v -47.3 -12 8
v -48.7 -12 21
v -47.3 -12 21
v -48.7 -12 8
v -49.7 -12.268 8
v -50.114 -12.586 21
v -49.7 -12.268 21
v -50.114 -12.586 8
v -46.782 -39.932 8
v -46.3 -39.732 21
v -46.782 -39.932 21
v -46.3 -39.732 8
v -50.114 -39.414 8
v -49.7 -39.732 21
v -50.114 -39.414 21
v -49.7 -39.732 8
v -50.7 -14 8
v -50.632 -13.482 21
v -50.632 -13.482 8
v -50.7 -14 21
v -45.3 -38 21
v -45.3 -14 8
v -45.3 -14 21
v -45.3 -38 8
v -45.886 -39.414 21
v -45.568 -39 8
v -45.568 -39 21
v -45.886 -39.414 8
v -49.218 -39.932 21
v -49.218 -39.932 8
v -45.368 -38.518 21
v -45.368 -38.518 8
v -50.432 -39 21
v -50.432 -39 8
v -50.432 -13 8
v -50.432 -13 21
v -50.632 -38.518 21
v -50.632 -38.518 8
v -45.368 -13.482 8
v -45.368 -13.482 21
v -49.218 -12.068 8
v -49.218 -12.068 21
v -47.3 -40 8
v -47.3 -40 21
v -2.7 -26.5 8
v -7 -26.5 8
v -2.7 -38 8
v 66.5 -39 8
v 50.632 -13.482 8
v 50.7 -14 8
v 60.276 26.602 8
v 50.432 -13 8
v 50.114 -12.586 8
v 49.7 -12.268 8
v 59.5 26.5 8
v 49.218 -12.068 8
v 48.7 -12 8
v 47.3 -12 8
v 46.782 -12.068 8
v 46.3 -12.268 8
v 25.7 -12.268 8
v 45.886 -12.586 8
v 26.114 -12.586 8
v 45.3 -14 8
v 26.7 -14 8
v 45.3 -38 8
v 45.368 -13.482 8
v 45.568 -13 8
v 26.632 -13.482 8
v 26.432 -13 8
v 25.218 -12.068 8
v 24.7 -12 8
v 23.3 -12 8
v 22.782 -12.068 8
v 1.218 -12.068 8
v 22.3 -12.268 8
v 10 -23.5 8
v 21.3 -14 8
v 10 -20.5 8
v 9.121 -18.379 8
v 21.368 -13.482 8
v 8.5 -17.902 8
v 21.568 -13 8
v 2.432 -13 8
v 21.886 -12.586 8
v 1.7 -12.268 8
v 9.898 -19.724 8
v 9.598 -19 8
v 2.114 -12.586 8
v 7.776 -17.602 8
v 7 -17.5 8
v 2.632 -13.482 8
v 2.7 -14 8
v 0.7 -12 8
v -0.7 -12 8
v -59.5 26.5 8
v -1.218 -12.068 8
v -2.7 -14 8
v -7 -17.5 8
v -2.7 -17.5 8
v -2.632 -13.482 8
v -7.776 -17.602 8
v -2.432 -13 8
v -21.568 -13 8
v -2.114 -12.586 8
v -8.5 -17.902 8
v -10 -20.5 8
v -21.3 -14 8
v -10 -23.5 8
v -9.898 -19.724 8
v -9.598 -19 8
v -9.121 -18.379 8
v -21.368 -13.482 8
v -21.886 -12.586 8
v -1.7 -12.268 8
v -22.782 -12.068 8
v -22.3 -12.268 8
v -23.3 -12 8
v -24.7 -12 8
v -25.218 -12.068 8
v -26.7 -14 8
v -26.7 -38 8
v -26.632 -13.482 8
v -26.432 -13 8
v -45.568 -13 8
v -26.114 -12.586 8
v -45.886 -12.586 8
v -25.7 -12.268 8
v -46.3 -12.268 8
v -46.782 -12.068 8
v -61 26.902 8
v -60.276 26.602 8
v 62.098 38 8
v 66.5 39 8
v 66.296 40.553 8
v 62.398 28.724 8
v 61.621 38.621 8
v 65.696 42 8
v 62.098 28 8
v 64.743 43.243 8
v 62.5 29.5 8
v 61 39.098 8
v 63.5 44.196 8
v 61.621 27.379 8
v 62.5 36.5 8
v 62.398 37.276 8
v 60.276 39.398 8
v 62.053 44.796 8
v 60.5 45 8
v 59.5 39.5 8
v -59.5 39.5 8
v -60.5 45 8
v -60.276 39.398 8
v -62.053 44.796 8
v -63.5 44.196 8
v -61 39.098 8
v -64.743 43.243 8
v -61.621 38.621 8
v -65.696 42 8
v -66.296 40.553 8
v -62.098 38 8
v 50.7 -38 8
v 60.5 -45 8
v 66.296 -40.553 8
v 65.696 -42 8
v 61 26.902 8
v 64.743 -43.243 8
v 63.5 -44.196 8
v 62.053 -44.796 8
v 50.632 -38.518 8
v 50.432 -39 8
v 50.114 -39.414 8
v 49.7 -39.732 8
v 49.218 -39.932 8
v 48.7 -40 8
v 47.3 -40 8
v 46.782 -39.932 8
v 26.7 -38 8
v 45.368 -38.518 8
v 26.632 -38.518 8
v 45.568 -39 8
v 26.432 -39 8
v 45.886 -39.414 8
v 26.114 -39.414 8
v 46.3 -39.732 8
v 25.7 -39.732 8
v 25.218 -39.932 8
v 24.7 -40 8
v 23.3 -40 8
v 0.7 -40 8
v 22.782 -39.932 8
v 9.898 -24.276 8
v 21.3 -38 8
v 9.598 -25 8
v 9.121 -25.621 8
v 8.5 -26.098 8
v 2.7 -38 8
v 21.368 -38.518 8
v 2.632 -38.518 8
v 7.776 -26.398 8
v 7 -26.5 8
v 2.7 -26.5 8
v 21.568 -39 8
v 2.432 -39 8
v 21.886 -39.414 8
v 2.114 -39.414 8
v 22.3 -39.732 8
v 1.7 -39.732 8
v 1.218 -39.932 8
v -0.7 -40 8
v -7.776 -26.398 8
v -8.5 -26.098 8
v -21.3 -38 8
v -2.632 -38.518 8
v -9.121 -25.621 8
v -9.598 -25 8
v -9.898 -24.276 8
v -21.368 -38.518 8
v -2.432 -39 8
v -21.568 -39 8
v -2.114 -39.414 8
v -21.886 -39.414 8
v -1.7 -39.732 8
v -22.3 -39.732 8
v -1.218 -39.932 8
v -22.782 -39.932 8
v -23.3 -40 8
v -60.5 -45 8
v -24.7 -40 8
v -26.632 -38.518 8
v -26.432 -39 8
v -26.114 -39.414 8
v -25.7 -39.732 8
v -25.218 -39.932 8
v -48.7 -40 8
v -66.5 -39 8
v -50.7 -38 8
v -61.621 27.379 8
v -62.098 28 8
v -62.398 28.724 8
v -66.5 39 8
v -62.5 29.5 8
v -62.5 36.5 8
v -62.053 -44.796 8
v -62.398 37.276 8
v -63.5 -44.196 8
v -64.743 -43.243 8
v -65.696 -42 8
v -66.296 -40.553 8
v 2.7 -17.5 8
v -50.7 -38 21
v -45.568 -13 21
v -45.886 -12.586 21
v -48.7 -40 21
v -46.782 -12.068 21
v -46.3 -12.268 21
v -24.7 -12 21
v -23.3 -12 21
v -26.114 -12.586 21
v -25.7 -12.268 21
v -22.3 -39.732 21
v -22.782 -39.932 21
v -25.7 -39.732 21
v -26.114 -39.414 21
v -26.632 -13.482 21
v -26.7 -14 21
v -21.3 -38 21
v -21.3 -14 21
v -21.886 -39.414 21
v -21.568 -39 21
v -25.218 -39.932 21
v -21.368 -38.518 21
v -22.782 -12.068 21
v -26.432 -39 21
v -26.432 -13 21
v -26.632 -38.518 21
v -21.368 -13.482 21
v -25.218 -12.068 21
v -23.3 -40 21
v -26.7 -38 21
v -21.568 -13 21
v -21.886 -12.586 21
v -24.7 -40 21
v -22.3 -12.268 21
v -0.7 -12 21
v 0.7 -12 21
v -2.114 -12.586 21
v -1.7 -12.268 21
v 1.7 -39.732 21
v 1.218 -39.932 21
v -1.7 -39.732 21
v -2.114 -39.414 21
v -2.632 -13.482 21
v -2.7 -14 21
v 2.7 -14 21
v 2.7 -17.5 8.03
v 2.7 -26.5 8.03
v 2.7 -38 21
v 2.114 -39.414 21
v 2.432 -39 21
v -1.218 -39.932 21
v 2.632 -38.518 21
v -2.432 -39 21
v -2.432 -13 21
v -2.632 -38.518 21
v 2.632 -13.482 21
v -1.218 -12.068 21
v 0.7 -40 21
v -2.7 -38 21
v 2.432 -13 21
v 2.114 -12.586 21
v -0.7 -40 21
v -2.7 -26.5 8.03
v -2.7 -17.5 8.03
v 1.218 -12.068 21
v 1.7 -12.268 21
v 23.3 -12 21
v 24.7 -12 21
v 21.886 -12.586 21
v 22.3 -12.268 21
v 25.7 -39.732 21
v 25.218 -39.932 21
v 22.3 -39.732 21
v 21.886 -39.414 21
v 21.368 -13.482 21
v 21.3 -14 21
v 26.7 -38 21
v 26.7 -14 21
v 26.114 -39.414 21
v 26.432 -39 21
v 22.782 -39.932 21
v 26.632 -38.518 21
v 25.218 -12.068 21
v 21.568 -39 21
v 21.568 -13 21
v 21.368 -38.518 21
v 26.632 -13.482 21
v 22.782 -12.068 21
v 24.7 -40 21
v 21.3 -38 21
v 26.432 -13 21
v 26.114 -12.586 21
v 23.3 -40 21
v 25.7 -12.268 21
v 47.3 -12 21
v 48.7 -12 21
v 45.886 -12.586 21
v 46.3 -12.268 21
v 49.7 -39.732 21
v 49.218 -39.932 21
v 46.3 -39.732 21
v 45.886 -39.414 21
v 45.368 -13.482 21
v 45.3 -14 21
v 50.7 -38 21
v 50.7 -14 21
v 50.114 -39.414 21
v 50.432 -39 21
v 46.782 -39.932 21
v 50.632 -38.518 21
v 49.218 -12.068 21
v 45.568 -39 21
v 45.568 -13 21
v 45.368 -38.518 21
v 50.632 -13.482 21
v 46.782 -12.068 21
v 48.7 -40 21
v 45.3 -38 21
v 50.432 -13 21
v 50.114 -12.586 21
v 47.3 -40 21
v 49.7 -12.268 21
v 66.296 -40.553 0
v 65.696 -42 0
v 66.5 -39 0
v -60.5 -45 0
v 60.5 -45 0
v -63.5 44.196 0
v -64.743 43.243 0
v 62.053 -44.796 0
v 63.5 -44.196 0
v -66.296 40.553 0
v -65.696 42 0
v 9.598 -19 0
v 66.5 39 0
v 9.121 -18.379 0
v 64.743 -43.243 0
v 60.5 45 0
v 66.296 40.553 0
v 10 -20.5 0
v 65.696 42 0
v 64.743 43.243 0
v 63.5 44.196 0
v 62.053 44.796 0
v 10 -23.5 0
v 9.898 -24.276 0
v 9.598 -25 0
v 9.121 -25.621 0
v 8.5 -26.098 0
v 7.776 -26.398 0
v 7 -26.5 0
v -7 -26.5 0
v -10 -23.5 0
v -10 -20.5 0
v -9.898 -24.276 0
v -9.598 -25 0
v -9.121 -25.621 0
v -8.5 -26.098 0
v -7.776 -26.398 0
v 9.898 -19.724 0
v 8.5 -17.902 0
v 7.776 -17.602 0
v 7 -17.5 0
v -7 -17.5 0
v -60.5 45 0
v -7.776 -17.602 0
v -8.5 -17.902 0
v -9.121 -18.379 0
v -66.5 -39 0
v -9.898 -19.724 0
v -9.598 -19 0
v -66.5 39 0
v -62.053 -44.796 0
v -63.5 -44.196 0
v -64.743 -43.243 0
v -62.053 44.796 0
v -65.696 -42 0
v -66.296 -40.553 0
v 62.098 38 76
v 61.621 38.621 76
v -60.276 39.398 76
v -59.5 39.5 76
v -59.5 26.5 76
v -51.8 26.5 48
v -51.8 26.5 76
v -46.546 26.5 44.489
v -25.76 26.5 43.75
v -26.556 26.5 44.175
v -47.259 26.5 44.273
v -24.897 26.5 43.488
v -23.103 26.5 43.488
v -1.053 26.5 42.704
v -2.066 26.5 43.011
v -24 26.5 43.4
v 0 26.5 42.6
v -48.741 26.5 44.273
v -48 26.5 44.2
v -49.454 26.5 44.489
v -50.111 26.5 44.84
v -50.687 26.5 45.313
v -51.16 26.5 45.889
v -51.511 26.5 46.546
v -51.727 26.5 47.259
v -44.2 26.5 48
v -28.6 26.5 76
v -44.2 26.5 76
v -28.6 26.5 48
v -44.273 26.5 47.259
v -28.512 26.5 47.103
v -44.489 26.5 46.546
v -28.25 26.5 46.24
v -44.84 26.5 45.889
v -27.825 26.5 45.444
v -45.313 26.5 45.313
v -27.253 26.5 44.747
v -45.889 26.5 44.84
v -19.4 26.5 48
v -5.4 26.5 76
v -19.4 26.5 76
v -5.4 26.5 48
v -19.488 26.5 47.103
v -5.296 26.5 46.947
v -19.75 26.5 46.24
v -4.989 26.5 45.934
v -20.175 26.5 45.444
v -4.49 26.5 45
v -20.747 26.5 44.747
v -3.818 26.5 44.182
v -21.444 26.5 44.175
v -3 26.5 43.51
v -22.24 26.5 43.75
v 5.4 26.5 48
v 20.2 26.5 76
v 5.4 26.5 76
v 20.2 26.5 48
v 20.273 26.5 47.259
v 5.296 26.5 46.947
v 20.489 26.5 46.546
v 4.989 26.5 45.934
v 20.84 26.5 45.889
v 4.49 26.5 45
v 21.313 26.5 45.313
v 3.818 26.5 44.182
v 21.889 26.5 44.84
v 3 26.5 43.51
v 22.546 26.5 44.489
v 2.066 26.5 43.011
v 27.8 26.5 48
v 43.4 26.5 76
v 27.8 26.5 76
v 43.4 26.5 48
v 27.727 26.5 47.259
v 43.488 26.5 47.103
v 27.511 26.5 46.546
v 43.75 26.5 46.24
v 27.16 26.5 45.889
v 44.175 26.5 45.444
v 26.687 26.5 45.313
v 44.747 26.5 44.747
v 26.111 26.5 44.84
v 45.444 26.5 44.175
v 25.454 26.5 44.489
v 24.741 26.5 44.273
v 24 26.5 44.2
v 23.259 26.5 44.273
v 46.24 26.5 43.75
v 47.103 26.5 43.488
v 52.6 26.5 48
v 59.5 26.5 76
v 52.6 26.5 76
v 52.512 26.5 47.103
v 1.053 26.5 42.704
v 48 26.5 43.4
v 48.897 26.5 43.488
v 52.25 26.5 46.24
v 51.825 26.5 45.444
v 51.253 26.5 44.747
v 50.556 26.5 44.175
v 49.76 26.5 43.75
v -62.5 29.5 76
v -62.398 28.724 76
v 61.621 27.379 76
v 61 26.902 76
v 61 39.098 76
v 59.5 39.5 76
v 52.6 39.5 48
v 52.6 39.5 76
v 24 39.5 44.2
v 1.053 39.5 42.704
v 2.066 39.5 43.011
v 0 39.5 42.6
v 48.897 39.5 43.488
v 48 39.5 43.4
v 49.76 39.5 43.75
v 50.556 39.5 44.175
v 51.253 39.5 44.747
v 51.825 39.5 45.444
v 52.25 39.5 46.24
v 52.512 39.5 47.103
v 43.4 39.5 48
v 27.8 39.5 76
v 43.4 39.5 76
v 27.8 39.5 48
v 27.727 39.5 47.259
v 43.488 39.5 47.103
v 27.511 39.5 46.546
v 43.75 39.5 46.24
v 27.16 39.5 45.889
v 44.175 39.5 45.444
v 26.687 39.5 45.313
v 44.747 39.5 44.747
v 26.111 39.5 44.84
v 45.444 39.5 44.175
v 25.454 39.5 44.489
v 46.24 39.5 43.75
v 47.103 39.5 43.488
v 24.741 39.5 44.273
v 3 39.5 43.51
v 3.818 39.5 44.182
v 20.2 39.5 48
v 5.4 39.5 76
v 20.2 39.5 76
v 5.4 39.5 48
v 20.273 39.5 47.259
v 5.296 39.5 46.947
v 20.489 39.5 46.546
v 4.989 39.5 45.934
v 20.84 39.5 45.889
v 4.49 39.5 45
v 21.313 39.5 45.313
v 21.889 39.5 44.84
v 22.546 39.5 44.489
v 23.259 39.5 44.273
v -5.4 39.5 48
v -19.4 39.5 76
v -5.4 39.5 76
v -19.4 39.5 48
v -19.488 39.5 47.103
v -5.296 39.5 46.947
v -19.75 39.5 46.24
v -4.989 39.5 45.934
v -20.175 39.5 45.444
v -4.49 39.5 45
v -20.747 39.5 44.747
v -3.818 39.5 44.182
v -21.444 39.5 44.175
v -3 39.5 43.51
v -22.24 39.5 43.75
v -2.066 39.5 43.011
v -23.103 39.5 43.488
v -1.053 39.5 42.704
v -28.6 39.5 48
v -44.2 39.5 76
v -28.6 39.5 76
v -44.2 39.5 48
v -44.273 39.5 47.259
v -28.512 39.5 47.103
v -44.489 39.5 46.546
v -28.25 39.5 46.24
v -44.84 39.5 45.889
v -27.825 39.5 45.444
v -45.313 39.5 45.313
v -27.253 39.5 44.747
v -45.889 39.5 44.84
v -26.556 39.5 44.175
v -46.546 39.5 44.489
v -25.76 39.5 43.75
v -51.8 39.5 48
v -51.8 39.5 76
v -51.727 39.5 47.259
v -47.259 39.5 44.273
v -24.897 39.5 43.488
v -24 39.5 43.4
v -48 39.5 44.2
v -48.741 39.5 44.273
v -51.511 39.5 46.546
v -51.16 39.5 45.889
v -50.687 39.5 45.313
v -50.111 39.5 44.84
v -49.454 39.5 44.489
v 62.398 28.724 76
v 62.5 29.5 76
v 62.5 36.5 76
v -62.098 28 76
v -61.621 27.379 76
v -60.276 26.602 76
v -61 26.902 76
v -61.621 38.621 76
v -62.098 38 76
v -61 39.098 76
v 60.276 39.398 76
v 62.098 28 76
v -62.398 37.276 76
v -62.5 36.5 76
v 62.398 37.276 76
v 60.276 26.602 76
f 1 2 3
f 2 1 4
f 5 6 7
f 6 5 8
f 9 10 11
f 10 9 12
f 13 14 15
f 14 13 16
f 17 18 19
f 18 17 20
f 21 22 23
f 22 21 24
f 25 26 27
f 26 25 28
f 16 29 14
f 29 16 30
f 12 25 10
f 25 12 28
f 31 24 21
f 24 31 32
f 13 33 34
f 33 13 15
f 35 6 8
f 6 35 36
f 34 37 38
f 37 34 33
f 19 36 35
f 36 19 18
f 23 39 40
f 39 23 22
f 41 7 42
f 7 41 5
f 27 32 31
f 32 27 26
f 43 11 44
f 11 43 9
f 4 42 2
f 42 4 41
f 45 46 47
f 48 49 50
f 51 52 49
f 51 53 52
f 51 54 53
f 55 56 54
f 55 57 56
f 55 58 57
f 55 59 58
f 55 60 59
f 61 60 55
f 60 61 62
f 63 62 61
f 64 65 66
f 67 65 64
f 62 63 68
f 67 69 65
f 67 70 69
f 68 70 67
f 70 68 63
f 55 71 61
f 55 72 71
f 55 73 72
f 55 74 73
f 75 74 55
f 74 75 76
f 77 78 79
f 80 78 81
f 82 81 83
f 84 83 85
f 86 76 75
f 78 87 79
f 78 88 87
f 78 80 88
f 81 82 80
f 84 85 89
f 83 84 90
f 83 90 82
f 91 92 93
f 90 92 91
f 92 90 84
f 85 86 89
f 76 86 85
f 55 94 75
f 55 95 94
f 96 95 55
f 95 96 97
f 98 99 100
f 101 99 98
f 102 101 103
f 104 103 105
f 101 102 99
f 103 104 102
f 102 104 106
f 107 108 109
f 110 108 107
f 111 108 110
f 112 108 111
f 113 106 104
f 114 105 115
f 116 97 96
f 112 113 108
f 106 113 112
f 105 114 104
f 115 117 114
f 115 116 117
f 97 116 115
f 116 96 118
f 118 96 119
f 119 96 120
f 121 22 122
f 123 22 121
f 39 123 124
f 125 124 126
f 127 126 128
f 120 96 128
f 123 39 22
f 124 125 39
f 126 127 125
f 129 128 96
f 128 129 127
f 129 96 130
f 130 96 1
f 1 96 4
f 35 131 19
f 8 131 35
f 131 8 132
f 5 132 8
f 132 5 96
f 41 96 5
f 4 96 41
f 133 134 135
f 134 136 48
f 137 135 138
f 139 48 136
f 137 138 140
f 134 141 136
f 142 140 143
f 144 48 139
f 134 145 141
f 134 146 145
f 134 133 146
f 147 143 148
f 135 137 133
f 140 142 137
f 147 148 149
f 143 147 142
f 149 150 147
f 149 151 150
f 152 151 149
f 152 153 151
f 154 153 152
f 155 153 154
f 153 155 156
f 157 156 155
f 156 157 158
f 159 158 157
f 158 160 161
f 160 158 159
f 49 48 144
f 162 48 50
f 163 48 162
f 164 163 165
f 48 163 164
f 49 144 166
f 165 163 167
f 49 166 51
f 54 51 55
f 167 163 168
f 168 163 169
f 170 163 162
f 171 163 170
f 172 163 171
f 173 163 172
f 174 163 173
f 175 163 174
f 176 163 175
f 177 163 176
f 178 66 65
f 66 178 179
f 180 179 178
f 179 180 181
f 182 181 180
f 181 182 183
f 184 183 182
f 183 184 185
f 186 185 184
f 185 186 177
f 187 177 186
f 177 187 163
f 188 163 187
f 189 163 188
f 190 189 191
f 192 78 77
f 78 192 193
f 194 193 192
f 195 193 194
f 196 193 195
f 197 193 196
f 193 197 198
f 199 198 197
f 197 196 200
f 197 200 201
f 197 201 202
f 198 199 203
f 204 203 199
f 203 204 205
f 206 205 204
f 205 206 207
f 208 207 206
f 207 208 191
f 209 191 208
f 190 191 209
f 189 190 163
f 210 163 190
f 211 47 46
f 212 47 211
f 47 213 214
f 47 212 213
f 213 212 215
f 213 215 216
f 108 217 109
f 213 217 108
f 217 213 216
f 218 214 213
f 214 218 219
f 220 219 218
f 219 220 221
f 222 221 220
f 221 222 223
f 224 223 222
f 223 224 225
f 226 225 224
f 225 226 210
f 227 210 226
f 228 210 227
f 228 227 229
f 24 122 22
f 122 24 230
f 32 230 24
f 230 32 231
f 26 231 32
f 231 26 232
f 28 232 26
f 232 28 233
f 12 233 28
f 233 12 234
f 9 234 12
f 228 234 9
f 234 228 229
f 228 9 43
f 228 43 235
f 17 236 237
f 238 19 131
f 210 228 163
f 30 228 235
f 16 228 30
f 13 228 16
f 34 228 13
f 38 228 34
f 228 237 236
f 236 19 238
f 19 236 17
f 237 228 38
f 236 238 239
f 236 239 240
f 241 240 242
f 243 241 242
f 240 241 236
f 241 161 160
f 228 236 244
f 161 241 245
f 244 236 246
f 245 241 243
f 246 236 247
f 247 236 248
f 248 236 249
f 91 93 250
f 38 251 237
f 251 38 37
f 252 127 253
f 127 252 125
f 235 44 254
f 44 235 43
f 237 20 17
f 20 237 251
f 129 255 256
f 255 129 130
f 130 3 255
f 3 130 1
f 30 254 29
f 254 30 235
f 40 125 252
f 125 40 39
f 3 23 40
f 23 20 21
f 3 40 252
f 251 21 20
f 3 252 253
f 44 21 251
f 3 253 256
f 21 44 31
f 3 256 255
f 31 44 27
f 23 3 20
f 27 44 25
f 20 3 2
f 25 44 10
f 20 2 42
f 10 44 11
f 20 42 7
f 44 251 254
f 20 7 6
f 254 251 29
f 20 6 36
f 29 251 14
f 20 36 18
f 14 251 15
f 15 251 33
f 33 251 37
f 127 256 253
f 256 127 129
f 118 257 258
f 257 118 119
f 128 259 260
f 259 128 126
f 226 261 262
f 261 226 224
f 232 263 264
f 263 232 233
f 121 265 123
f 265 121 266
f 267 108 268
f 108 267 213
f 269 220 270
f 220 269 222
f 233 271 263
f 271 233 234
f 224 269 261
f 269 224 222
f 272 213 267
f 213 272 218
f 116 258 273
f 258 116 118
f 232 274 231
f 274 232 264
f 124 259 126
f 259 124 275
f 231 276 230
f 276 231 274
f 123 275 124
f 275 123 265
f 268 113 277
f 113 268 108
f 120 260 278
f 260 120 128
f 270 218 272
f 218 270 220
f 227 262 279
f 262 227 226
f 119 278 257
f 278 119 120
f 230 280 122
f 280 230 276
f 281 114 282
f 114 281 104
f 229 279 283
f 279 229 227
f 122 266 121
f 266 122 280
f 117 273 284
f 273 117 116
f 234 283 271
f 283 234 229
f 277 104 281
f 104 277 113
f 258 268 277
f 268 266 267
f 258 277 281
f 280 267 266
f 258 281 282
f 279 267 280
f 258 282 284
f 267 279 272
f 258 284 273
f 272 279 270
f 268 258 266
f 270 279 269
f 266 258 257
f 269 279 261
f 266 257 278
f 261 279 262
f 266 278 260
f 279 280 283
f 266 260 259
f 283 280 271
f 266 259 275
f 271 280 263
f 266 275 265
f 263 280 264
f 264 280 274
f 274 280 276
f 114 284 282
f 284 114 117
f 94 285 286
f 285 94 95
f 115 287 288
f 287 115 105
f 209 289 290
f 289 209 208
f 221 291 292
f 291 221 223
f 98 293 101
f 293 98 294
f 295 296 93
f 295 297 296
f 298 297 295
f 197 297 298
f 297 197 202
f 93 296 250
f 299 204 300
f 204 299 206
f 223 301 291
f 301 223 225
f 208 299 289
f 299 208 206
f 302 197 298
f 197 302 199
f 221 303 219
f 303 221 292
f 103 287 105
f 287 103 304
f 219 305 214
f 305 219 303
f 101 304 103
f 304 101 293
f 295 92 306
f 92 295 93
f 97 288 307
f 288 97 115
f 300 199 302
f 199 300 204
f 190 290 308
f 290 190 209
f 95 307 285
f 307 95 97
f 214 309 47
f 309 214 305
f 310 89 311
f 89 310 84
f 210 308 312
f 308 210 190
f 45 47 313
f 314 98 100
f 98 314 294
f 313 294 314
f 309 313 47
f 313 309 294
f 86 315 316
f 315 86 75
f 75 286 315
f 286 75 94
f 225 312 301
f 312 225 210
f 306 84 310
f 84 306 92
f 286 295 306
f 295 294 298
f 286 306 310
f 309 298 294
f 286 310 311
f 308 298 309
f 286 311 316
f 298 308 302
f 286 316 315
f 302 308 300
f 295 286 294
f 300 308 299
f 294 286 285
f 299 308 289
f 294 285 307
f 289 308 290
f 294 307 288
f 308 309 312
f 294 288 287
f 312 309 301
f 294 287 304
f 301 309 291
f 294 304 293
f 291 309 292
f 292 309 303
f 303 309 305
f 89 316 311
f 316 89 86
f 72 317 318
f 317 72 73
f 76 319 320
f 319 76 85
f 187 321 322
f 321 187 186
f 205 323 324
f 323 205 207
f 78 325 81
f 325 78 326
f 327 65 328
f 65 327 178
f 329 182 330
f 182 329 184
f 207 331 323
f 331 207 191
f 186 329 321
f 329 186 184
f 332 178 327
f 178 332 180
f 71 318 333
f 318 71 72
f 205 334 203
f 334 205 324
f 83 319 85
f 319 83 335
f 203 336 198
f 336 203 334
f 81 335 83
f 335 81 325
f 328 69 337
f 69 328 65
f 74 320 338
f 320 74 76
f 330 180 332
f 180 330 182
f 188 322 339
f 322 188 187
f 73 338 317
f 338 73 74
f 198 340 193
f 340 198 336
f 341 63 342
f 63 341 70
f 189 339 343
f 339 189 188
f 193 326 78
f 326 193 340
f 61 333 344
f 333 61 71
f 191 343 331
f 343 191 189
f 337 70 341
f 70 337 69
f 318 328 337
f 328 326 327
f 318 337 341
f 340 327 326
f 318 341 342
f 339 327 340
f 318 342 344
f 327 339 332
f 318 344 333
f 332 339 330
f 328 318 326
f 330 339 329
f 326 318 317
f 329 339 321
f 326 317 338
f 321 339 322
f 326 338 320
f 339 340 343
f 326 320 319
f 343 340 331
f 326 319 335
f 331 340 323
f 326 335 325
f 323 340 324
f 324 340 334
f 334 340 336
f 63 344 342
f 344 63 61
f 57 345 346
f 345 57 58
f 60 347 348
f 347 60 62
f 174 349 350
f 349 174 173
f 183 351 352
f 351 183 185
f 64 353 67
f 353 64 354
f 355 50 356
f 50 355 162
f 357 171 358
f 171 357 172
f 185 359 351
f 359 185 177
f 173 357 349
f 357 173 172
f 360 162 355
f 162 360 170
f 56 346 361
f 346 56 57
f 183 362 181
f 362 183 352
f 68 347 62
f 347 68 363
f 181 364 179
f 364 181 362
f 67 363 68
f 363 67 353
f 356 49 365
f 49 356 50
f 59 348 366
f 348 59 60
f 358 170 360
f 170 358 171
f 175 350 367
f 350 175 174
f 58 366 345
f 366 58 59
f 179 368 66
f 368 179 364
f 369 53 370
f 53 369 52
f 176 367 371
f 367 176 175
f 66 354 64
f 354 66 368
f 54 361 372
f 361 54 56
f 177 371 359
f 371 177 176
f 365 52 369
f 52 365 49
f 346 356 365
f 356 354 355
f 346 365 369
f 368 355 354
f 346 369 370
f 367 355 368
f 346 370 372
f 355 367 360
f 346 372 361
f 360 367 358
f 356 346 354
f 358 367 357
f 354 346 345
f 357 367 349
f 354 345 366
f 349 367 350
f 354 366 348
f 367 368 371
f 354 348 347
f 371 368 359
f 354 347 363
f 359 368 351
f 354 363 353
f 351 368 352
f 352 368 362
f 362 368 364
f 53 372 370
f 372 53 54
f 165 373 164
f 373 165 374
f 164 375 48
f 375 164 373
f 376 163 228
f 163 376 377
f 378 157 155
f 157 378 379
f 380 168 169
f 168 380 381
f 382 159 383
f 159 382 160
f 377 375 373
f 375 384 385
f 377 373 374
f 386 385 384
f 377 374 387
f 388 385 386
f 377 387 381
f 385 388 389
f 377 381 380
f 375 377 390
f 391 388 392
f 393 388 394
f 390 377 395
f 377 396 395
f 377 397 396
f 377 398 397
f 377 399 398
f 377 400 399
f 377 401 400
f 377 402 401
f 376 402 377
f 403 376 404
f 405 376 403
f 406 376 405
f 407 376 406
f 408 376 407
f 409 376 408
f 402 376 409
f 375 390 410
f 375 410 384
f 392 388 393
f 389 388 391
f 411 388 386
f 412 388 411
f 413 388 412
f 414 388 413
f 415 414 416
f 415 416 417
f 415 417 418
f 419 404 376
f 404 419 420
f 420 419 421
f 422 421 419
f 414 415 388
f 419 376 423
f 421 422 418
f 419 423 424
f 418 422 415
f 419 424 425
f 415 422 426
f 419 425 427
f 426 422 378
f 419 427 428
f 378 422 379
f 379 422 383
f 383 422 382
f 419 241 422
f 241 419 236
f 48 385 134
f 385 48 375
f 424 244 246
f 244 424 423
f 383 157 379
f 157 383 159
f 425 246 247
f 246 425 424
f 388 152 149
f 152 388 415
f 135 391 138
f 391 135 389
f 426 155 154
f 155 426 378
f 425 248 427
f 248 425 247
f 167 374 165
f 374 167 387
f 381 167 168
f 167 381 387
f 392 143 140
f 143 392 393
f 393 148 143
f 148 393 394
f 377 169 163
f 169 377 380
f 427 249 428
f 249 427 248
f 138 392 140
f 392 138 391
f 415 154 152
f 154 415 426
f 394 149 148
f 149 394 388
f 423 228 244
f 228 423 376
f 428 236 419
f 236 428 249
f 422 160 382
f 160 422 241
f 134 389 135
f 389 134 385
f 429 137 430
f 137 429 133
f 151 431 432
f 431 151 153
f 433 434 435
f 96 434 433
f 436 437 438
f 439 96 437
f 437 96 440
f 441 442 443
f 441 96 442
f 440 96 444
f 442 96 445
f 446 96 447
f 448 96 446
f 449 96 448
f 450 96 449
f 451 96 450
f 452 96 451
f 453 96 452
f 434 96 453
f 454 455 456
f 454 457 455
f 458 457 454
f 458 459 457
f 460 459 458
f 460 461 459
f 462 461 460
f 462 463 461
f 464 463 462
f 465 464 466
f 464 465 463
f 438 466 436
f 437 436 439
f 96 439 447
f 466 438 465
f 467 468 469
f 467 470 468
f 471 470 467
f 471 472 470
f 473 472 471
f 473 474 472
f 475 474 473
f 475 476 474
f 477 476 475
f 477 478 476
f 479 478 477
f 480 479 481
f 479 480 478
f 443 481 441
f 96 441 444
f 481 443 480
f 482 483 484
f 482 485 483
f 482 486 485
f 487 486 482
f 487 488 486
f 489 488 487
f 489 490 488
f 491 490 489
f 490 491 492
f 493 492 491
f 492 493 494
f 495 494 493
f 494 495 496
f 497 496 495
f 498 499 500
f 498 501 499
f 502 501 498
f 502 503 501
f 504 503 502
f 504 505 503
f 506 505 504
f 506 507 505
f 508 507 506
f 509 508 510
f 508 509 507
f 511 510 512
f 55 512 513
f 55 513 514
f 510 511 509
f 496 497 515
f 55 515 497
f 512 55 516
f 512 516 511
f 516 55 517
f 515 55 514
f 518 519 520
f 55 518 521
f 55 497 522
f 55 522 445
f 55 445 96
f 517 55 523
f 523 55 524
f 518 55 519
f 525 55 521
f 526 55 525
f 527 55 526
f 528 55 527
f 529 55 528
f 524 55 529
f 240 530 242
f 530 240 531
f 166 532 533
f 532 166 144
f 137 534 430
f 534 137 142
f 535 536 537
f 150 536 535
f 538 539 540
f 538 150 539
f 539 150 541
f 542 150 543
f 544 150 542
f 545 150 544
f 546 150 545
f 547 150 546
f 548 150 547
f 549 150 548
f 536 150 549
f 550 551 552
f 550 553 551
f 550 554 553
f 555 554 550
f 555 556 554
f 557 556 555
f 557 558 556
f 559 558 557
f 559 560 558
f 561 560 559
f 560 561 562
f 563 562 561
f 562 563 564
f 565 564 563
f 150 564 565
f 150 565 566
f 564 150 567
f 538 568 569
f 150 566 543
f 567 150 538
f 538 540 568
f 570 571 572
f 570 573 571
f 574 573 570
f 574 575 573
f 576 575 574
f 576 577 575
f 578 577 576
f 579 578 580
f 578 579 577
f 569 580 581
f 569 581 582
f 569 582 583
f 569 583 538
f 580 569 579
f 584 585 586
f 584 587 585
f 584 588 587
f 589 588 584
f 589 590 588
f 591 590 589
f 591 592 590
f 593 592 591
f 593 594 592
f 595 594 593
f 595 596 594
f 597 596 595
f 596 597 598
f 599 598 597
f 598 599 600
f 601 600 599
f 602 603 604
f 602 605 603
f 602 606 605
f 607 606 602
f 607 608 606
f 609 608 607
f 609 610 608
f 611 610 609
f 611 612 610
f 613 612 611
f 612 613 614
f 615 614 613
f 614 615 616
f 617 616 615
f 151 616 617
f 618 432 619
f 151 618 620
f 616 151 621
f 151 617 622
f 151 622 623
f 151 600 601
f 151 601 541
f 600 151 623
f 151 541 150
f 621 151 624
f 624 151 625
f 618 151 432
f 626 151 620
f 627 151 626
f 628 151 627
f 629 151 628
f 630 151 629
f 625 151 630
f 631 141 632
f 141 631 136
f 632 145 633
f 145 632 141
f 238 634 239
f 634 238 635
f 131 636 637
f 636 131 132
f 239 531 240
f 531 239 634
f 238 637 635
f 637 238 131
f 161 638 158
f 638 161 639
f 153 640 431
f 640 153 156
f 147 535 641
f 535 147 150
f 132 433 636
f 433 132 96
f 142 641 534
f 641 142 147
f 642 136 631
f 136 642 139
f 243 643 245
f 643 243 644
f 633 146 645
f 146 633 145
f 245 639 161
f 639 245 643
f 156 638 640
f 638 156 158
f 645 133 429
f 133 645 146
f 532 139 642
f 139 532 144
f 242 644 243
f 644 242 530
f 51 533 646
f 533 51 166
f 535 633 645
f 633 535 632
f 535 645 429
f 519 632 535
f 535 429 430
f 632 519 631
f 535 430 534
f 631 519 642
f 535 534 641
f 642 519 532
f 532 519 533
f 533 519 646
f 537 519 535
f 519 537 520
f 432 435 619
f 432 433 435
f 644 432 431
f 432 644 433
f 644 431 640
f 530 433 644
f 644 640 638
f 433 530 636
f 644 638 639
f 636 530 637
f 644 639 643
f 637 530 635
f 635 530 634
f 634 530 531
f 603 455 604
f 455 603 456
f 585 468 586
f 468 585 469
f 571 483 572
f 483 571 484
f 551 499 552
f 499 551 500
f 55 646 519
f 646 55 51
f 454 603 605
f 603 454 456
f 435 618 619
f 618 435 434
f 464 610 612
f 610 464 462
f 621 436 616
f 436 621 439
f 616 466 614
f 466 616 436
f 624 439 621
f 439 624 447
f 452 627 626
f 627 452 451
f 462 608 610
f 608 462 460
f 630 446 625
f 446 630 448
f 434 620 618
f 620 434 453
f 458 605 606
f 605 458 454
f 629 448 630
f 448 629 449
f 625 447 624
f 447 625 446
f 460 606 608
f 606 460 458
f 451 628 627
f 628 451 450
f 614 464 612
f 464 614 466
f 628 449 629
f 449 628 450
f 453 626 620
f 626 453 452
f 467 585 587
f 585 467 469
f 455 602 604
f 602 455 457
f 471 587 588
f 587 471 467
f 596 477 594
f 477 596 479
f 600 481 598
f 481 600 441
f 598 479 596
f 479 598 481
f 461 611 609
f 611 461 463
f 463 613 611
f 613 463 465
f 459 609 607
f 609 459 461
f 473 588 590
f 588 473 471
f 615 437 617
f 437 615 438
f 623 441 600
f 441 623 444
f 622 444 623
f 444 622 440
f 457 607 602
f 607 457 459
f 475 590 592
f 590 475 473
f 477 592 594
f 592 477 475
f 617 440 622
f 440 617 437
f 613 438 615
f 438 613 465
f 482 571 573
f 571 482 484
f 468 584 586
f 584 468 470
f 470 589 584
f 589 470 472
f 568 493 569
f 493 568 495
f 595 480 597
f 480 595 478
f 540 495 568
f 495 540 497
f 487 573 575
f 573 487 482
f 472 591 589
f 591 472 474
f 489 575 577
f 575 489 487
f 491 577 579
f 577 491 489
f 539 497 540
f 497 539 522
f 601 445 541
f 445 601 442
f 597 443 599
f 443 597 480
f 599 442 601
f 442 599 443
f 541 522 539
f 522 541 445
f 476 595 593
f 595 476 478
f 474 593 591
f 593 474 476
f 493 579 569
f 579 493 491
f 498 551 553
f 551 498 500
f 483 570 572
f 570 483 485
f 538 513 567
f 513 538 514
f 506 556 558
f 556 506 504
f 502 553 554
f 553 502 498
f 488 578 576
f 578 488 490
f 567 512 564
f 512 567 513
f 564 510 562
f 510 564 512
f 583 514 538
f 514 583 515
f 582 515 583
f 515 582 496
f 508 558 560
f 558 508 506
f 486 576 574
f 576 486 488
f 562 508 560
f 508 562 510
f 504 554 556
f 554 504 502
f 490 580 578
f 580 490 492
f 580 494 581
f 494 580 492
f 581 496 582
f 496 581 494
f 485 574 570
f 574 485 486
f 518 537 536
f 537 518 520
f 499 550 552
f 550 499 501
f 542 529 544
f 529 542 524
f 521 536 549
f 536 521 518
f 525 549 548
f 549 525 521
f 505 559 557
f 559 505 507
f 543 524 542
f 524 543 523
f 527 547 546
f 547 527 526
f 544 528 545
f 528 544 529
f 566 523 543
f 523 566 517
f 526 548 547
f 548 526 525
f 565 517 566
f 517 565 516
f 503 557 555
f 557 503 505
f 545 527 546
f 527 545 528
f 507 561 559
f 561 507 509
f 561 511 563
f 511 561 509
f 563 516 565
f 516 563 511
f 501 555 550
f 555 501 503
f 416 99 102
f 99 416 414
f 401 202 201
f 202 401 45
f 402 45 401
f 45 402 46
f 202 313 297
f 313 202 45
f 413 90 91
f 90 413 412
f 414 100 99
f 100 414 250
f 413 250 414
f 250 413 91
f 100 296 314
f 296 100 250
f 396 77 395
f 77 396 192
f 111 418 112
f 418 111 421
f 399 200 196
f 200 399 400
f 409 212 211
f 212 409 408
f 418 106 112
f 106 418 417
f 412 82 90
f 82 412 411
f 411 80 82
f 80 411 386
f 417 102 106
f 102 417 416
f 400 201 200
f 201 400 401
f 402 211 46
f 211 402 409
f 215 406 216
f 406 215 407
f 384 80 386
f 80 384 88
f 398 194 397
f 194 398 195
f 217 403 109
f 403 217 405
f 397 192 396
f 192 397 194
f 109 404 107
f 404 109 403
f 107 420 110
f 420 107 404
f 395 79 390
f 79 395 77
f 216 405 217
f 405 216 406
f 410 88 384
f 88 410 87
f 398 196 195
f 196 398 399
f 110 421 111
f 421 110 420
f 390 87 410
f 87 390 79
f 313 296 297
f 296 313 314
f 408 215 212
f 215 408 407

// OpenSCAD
// SPDX-License-Identifier: MIT
// Cable Sort Desk Hub | Refined batch 01 | OpenSCAD mm/Z-up.
// Prototype: slicer, fit, material, stability and safety remain UNVERIFIED.
use <lib/commerce_forms.scad> // v1.3 compatibility; other SKUs retain their original template.
use <lib/refined_forms.scad>
width_mm = 133;
depth_mm = 90;
height_mm = 76;
refined_form(slug="cable-sort-desk-hub", family="organizer", variant=2, w=width_mm, d=depth_mm, h=height_mm);
